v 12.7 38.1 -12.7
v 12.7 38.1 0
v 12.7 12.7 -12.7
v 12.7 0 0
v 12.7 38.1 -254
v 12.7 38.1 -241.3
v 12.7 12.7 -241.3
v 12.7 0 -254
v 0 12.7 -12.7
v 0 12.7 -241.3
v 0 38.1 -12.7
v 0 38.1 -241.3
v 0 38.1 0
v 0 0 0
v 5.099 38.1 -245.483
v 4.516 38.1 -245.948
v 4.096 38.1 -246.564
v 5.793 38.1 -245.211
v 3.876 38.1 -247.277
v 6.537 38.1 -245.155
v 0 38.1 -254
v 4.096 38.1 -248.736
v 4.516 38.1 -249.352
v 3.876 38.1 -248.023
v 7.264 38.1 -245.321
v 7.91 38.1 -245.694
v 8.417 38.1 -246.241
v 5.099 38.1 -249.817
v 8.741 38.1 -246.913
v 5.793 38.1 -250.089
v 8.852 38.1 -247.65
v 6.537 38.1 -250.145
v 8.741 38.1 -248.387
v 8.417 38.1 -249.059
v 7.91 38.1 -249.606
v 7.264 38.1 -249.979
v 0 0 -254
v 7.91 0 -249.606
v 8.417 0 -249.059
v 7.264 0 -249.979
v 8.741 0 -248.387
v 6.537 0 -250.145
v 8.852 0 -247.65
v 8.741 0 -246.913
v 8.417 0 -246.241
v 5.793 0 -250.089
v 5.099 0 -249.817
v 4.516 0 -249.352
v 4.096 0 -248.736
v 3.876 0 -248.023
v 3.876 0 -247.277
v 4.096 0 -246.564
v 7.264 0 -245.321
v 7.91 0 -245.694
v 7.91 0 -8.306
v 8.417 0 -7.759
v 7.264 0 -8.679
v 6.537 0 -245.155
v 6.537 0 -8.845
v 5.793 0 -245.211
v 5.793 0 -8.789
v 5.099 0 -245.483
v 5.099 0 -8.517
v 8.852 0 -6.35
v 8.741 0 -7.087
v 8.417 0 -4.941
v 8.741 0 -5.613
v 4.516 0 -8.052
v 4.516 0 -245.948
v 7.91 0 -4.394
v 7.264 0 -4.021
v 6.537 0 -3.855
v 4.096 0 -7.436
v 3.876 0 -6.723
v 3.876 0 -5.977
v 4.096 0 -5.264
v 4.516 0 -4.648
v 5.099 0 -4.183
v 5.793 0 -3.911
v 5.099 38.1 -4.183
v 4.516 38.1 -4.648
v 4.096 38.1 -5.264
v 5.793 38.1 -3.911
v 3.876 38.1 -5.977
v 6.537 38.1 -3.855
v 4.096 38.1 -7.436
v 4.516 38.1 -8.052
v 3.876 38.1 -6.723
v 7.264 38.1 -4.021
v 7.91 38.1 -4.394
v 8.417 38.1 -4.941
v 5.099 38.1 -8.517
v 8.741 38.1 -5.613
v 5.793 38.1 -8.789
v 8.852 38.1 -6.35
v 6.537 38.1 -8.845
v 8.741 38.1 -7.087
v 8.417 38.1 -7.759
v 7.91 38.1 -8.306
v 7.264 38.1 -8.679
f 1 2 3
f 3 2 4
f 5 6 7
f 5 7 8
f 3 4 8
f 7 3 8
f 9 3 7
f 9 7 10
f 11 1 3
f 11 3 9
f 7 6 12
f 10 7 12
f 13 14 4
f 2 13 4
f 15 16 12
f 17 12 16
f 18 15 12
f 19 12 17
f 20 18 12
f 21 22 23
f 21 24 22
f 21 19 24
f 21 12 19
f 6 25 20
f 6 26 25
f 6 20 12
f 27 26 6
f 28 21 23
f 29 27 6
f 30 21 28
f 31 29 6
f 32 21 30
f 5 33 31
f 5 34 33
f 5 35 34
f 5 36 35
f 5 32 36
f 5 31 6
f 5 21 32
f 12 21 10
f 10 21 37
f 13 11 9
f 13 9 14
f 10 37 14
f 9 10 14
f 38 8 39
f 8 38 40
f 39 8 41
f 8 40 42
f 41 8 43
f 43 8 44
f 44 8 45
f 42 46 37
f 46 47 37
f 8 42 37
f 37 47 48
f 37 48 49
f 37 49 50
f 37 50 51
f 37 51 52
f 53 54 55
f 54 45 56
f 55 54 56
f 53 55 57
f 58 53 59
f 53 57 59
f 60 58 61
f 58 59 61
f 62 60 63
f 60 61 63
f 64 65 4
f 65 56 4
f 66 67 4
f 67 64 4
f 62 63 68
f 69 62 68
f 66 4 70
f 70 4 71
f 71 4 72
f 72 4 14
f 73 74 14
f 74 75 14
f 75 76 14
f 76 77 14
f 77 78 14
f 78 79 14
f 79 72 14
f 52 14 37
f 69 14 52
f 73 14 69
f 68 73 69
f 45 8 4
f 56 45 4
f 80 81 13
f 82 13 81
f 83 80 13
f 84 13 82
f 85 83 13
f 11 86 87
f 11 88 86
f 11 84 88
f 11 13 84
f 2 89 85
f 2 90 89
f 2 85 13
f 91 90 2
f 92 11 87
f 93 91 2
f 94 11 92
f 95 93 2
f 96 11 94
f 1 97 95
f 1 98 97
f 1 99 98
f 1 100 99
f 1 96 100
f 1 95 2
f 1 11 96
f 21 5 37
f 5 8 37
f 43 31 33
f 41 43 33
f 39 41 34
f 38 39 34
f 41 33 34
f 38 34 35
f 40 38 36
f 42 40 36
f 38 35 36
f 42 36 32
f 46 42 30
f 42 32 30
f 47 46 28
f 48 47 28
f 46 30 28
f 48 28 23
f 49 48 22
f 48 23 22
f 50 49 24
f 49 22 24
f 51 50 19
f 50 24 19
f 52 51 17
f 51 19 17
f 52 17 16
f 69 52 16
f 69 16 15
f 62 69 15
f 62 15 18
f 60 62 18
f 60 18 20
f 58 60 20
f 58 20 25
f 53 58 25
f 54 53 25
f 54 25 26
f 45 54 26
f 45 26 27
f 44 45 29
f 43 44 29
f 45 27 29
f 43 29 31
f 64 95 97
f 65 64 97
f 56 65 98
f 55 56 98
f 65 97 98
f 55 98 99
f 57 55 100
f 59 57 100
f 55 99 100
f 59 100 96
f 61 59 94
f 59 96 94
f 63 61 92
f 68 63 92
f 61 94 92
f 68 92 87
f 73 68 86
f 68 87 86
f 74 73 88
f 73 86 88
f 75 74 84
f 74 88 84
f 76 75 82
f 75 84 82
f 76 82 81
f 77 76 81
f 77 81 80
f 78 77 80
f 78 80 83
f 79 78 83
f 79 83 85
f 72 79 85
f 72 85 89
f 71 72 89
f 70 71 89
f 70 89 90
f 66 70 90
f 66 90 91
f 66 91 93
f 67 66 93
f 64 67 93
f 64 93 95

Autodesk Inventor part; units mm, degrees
ref_plane "YZ Plane" through (0, 0, 0) normal (1, 0, 0) x (0, 1, 0)
ref_plane "XZ Plane" through (0, 0, 0) normal (0, 1, 0) x (-1, 0, 0)
ref_plane "XY Plane" through (0, 0, 0) normal (0, 0, 1) x (1, 0, 0)
sketch "Sketch1" plane through (0, 0, 0) normal (0, 1, 0) x (-1, 0, 0)
  line L0 (0, 0) -> (-12.7, 0)
  line L1 (-12.7, 0) -> (-12.7, -254)
  line L2 (-12.7, -254) -> (0, -254)
  line L3 (0, -254) -> (0, 0)
  dimension "d0" = 254
  dimension "d1" = 12.7
extrude "Extrusion1" add sketch "Sketch1" along normal blind 12.7
sketch "Sketch2" plane through (0, 12.7, 0) normal (0, 1, 0) x (1, 0, 0)
  line L0 (12.7, 0) -> (12.7, 254) projected
  line L1 (0, 0) -> (12.7, 0)
  line L2 (12.7, 0) -> (12.7, 12.7)
  line L3 (12.7, 12.7) -> (0, 12.7)
  line L4 (0, 12.7) -> (0, 0)
  line L5 (12.7, 254) -> (0, 254) projected
  line L6 (0, 254) -> (12.7, 254)
  line L7 (12.7, 254) -> (12.7, 241.3)
  line L8 (12.7, 241.3) -> (0, 241.3)
  line L9 (0, 241.3) -> (0, 254)
  dimension "d4" = 12.7
extrude "Extrusion2" add sketch "Sketch2" along normal blind 25.4
sketch "Sketch3" plane through (0, 38.1, 0) normal (0, 1, 0) x (1, 0, 0)
  circle A0 centre (6.35, 6.35) radius 2.5019
  line L0 (0, 0) -> (12.7, 0) projected
  line L1 (12.7, 0) -> (12.7, 12.7) projected
  circle A1 centre (6.35, 247.65) radius 2.5019
  dimension "d7" = 5.0038
  dimension "d8" = 6.35
  dimension "d9" = 6.35
  dimension "d12" = 241.3
extrude "Extrusion3" cut sketch "Sketch3" against normal up to surface (38.1 mm away)
properties part number "handle ds"
